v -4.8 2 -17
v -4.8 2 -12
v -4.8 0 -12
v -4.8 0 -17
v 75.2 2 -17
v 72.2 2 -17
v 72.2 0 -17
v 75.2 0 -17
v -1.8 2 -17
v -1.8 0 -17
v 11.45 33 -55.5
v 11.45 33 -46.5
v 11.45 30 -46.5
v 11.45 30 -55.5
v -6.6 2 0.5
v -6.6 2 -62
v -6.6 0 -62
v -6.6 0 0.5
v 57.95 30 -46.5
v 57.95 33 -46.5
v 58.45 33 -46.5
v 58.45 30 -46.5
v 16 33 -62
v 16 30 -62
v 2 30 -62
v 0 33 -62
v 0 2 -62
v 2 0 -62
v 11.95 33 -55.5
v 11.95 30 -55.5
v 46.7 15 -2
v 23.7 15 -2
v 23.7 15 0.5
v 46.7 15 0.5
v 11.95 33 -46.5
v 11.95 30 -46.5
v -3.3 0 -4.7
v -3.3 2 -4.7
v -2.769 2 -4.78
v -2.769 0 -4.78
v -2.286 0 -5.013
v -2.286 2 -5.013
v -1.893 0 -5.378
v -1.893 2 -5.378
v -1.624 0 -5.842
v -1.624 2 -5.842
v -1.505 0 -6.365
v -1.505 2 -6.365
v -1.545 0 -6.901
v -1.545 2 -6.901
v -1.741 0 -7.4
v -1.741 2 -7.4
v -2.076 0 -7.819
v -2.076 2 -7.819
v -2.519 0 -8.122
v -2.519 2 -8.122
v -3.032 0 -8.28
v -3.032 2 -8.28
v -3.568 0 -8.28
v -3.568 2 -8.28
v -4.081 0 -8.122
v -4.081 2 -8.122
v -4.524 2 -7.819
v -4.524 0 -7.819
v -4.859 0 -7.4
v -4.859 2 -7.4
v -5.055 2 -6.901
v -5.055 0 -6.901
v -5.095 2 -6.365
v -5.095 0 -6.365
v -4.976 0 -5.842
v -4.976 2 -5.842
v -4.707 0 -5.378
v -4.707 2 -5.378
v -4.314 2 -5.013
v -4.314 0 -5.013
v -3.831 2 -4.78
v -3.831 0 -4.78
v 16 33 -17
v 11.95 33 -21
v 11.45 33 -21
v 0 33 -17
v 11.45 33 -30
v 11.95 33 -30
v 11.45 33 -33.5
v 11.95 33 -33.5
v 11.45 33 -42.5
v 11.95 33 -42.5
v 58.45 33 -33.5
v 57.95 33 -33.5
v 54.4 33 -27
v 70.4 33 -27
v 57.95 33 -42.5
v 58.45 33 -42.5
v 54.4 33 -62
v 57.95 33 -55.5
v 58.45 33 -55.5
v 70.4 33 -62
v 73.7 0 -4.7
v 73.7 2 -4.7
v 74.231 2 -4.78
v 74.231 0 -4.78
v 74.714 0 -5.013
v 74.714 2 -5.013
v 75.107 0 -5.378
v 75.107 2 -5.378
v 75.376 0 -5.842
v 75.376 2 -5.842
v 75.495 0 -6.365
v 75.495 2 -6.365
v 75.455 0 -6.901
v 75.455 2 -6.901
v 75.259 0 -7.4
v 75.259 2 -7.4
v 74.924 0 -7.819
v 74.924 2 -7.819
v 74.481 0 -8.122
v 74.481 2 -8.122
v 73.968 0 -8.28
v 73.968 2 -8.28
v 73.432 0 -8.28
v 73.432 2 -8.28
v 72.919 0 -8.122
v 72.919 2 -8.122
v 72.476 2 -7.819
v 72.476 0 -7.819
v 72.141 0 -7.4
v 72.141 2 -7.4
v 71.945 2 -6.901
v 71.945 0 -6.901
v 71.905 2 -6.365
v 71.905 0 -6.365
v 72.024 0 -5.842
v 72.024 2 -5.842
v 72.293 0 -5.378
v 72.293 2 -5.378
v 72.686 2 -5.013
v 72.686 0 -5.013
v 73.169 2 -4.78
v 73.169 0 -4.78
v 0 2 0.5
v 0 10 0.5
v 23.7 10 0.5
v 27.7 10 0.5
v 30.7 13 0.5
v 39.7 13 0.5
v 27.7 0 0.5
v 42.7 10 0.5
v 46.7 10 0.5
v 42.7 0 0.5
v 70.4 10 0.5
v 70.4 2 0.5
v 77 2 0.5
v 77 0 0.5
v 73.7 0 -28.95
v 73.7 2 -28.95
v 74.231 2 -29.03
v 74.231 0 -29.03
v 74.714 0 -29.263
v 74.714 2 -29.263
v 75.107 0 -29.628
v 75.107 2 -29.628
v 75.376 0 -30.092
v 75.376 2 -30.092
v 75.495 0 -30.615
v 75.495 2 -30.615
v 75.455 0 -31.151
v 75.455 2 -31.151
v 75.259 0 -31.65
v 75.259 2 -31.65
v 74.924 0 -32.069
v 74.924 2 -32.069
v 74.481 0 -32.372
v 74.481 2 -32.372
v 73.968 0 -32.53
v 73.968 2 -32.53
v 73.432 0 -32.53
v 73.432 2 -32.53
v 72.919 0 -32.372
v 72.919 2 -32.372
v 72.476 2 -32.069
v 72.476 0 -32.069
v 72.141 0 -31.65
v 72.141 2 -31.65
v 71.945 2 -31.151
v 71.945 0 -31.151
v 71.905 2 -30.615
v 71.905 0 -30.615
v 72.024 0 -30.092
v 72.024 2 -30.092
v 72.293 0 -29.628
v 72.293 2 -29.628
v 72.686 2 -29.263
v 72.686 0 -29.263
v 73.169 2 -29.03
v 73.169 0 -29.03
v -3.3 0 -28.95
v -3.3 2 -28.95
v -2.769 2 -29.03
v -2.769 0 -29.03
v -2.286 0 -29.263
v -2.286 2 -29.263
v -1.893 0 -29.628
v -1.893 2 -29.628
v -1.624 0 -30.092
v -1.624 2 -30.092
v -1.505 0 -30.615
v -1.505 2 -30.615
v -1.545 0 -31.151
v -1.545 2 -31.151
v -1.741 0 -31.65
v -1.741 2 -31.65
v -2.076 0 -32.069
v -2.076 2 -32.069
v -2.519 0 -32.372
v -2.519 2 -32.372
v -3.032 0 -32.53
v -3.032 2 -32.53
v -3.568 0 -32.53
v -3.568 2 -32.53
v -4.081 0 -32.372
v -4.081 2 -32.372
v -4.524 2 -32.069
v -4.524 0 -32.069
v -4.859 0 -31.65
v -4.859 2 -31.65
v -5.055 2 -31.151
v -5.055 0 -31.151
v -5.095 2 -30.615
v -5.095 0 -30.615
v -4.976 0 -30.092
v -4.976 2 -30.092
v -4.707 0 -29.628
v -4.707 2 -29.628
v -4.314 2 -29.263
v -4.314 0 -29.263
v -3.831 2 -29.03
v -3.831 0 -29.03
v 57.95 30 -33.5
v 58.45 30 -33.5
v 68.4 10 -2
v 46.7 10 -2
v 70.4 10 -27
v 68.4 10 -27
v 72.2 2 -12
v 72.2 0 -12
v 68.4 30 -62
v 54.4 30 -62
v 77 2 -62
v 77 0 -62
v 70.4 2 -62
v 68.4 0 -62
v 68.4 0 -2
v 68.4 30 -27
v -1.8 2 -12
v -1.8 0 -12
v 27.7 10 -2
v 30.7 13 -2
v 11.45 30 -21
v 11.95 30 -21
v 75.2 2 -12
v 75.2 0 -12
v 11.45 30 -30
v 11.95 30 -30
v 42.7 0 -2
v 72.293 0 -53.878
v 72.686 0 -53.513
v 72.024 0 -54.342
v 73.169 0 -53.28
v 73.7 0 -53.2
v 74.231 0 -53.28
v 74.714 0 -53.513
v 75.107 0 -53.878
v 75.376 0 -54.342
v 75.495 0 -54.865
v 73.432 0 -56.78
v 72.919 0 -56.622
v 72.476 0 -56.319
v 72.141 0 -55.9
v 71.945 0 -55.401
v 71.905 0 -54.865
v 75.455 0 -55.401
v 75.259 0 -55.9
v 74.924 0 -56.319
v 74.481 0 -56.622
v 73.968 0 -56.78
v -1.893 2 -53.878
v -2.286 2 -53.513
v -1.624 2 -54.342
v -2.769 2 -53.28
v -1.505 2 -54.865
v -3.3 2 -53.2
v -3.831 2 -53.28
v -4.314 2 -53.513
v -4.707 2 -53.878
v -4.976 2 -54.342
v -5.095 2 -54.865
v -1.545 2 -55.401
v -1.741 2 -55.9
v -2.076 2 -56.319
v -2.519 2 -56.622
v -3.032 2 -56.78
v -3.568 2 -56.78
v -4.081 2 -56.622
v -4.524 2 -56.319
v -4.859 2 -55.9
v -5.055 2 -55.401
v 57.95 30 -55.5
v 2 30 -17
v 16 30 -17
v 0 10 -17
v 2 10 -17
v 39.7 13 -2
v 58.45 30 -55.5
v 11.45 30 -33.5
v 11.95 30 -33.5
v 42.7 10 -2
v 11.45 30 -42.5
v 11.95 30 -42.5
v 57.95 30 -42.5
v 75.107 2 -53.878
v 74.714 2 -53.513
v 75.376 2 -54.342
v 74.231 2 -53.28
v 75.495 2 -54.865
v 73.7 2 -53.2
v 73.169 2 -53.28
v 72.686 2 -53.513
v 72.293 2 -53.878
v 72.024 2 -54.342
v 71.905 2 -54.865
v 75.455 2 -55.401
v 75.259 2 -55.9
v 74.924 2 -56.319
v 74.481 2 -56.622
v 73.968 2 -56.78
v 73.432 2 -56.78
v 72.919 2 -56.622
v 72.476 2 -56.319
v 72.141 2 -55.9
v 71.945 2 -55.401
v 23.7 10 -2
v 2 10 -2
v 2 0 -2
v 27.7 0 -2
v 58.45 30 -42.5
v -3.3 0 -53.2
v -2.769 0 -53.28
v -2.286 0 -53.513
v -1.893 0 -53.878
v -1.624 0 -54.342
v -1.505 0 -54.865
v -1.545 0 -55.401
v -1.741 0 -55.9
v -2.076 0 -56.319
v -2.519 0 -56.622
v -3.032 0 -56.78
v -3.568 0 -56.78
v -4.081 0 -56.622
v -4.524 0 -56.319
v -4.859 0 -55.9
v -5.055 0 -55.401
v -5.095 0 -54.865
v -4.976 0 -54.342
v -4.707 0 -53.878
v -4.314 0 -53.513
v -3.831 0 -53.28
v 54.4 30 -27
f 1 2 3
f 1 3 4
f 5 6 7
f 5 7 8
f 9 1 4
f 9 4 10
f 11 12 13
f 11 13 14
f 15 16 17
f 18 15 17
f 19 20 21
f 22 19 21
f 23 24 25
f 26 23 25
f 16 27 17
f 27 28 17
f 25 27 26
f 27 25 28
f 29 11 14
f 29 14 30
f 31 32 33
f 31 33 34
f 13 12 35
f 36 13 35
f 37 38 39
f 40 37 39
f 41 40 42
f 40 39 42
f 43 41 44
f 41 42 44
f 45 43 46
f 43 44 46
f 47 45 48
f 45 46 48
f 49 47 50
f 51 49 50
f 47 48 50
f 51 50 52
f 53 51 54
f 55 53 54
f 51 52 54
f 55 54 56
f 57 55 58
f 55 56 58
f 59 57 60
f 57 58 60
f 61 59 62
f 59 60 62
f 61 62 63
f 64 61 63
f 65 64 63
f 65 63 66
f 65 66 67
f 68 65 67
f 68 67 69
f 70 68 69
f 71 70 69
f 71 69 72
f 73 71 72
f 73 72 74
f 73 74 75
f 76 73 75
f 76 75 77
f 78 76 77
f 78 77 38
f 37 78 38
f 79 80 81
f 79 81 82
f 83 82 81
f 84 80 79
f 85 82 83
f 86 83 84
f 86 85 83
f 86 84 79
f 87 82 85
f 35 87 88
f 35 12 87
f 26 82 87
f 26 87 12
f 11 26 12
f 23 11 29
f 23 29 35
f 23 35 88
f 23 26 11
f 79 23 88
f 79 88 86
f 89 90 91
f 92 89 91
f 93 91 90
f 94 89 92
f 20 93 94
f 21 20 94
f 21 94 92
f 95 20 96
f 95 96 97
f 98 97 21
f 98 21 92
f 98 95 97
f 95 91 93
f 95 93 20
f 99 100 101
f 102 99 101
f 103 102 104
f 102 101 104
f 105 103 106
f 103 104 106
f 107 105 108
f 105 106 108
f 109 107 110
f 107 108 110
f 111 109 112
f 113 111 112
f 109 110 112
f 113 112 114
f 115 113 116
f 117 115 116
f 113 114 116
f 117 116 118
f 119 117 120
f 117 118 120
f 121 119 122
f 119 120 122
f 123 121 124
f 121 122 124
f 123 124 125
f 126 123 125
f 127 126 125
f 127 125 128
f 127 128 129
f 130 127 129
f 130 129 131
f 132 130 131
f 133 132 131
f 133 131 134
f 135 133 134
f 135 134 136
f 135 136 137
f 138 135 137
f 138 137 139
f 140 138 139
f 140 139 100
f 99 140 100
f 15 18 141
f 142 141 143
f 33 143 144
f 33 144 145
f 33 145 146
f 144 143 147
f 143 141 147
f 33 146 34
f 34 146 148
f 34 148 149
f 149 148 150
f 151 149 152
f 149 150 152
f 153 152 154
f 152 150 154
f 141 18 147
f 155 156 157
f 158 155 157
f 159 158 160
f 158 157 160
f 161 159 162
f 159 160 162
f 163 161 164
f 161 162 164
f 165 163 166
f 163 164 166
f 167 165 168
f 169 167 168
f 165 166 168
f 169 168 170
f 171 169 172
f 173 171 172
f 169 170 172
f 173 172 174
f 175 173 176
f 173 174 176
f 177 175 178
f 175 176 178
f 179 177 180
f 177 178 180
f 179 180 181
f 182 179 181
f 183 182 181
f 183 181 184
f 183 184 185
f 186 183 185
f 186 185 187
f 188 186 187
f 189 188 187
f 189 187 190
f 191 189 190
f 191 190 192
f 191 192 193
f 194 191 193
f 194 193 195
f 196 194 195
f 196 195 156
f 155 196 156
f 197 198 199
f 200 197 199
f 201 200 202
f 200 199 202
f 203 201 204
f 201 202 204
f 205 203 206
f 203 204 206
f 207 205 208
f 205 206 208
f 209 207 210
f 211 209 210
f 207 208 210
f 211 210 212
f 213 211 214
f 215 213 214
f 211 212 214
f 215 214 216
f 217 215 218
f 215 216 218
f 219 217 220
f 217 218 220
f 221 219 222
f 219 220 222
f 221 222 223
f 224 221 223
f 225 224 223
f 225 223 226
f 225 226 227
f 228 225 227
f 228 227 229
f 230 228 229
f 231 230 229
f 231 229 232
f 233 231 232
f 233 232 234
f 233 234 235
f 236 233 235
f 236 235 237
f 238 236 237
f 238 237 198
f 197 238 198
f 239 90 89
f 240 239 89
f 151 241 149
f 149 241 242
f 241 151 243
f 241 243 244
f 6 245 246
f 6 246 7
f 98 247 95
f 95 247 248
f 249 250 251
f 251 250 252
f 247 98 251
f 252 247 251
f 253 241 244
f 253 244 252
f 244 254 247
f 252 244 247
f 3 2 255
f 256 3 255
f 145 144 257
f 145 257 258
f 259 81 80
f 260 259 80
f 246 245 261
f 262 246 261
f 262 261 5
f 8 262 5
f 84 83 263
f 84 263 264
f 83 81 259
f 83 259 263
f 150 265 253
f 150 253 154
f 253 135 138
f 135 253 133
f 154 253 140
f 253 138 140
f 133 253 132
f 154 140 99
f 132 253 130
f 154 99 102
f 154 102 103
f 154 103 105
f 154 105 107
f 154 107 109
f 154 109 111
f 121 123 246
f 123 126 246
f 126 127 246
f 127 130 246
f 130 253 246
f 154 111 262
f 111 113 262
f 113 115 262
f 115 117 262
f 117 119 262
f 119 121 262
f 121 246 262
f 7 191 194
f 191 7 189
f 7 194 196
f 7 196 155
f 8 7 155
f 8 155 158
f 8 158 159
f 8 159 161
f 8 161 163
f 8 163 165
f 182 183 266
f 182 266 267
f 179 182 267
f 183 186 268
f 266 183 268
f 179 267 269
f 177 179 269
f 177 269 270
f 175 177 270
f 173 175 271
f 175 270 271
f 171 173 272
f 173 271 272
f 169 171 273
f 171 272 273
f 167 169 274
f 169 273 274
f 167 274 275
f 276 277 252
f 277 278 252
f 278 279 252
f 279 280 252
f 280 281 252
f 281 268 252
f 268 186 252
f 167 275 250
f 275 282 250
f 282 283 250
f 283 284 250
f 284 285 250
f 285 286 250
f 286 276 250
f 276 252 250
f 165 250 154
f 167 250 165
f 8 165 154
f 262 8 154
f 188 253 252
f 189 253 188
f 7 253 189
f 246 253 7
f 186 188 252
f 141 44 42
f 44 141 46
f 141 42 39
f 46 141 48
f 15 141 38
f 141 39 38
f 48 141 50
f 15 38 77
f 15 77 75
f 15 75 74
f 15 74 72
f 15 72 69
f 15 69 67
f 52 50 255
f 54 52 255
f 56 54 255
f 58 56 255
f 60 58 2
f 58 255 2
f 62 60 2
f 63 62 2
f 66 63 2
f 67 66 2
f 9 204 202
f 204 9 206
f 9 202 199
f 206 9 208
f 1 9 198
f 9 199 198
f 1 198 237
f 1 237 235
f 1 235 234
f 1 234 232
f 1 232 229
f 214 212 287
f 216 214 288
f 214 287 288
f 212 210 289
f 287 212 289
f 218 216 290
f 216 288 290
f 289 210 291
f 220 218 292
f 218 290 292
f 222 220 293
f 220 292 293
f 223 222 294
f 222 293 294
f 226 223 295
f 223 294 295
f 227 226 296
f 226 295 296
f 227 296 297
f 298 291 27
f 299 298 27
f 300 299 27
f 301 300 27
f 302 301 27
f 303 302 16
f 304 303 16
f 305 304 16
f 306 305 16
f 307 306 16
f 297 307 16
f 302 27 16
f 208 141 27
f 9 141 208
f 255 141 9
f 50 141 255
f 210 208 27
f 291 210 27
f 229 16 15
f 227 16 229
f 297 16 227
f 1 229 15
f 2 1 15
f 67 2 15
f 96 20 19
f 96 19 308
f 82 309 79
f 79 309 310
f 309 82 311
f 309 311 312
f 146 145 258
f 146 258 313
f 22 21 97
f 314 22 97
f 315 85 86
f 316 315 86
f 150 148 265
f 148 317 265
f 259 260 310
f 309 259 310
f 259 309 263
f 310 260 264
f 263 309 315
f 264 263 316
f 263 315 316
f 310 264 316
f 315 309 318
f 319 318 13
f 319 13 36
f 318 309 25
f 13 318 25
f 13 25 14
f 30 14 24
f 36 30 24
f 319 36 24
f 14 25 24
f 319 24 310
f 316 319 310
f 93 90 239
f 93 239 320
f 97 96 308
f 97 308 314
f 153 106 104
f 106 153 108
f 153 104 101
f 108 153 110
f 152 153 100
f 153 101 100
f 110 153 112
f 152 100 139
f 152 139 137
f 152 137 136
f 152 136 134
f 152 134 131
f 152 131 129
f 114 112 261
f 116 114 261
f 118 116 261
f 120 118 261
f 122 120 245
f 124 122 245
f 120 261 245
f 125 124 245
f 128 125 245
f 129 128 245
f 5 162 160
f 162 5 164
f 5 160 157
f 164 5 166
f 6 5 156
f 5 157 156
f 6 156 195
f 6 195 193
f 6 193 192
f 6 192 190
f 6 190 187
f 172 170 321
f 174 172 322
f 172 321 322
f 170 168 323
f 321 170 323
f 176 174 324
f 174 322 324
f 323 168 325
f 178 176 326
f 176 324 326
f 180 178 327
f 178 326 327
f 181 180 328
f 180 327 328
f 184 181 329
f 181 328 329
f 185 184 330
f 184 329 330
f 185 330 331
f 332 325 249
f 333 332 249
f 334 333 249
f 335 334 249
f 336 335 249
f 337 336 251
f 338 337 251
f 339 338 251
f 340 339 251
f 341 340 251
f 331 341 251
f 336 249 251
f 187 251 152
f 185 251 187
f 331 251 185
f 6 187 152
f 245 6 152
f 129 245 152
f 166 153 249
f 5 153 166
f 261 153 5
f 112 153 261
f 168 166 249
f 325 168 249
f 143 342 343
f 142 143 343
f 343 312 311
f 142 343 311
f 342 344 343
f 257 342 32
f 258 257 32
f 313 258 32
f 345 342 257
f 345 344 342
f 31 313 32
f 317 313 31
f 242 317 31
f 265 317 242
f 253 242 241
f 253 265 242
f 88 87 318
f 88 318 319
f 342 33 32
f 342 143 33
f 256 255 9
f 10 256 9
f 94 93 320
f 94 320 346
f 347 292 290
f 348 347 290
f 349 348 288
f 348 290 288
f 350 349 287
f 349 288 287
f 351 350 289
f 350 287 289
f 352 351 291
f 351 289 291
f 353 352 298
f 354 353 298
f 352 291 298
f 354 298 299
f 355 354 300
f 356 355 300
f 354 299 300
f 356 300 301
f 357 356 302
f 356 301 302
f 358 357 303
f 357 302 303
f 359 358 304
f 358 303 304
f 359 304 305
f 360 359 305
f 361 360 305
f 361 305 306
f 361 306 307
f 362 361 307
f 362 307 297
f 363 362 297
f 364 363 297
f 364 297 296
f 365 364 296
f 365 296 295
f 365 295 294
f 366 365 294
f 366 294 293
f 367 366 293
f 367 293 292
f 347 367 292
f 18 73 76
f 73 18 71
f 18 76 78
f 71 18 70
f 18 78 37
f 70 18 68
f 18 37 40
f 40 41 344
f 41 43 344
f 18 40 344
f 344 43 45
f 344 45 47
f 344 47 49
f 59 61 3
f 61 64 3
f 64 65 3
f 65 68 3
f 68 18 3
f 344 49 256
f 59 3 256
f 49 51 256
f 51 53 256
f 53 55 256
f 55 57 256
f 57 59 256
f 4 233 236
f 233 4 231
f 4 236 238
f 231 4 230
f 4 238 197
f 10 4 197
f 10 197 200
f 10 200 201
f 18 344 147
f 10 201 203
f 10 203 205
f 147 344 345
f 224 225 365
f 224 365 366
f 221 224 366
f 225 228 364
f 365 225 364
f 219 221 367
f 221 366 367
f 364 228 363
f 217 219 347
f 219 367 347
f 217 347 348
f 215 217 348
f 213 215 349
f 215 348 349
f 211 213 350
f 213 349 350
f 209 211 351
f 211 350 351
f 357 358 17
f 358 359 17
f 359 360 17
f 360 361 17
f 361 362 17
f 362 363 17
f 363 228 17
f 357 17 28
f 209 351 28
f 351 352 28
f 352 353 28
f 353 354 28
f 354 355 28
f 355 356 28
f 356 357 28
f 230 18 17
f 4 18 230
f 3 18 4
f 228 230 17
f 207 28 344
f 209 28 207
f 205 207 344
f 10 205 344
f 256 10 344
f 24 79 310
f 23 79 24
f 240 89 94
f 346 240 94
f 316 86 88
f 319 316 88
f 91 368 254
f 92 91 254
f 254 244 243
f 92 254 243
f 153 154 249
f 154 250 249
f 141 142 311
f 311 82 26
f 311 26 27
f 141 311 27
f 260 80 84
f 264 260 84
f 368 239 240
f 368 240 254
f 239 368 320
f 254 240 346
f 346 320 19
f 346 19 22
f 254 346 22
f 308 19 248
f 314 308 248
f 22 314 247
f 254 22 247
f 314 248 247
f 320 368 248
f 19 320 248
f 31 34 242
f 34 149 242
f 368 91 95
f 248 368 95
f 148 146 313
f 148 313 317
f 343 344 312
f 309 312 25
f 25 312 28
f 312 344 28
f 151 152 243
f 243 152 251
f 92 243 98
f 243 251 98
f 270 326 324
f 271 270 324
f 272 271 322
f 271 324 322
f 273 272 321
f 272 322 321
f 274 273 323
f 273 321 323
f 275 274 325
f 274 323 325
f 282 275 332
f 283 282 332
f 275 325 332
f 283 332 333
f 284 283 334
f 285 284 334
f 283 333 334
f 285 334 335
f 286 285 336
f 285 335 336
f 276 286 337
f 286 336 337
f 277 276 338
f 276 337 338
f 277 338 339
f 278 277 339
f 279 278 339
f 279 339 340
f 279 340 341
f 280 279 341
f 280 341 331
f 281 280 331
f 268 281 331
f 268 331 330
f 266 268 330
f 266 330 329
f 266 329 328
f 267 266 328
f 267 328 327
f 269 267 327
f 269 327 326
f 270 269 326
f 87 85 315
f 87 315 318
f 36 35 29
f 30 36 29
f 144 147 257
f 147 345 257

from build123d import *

# Parameters (mm, degrees)
SKETCH1_W            = 70.4
SKETCH1_H            = 2
BOSS_EXTRUDE2_DEPTH  = 10
SKETCH2_W            = 2
SKETCH2_H            = 55
BOSS_EXTRUDE3_DEPTH  = 10
SKETCH3_W            = 19
SKETCH3_H            = 3
BOSS_EXTRUDE4_DEPTH  = 2
SKETCH4_W            = 15
SKETCH4_H            = 10
CUT_EXTRUDE2_DEPTH   = 2
SKETCH5_W            = 2
SKETCH5_H            = 3
BOSS_EXTRUDE5_DEPTH  = 1
SKETCH6_W            = 2
SKETCH6_H            = 3
BOSS_EXTRUDE6_DEPTH  = 1
SKETCH7_W            = 57
SKETCH7_H            = 2
BOSS_EXTRUDE7_DEPTH  = 6.6
SKETCH8_W            = 57
SKETCH8_H            = 2
BOSS_EXTRUDE8_DEPTH  = 6.6
BOSS_EXTRUDE9_DEPTH  = 5
SKETCH12_W           = 2
SKETCH12_H           = 5
SKETCH12_H_2         = 40
SKETCH12_H_3         = 30
BOSS_EXTRUDE10_DEPTH = 20
BOSS_EXTRUDE11_DEPTH = 3
SKETCH14_W           = 0.5
SKETCH14_H           = 9
CUT_EXTRUDE3_DEPTH   = 3
SKETCH15_W           = 38.4
SKETCH15_H           = 45
CUT_EXTRUDE4_DEPTH   = 3
BOSS_EXTRUDE12_DEPTH = 0.5
SKETCH17_R           = 1.8
SKETCH17_W           = 3
SKETCH17_H           = 5
CUT_EXTRUDE6_DEPTH   = 3
SKETCH18_W           = 2.5
SKETCH18_H           = 3
BOSS_EXTRUDE13_DEPTH = 1
SKETCH19_W           = 2.5
SKETCH19_H           = 3
BOSS_EXTRUDE14_DEPTH = 1
SKETCH20_W           = 23
SKETCH20_H           = 2.5
BOSS_EXTRUDE15_DEPTH = 2
CUT_EXTRUDE8_DEPTH   = 3


with BuildPart() as part:
    # Sketch1 → Boss-Extrude2 (new body)
    with BuildSketch(Plane(origin=(0, 0, 0), x_dir=(1, 0, 0), z_dir=(0, 1, 0))):
        with Locations((35.2, 1)):
            Rectangle(SKETCH1_W, SKETCH1_H)
    extrude(amount=BOSS_EXTRUDE2_DEPTH)

    # Sketch2 → Boss-Extrude3 (add)
    with BuildSketch(Plane(origin=(0, 10, 0), x_dir=(1, 0, 0), z_dir=(0, 1, 0))):
        with Locations((1, 29.5)):
            Rectangle(SKETCH2_W, SKETCH2_H)
        with Locations((69.4, 29.5)):
            Rectangle(SKETCH2_W, SKETCH2_H)
    extrude(amount=-BOSS_EXTRUDE3_DEPTH)

    # Sketch3 → Boss-Extrude4 (add)
    with BuildSketch(Plane.XY):
        with Locations((35.2, 11.5)):
            Rectangle(SKETCH3_W, SKETCH3_H)
    extrude(amount=-BOSS_EXTRUDE4_DEPTH)

    # Sketch4 → Cut-Extrude2 (cut)
    with BuildSketch(Plane.XY):
        with Locations((35.2, 5)):
            Rectangle(SKETCH4_W, SKETCH4_H)
    extrude(amount=-CUT_EXTRUDE2_DEPTH, mode=Mode.SUBTRACT)

    # Sketch5 → Boss-Extrude5 (add)
    with BuildSketch(Plane.ZY.offset(-25.7)):
        with Locations((-1, 11.5)):
            Rectangle(SKETCH5_W, SKETCH5_H)
    extrude(amount=BOSS_EXTRUDE5_DEPTH)

    # Sketch6 → Boss-Extrude6 (add)
    with BuildSketch(Plane(origin=(44.7, 0, 0), x_dir=(0, 0, -1), z_dir=(1, 0, 0))):
        with Locations((1, 11.5)):
            Rectangle(SKETCH6_W, SKETCH6_H)
    extrude(amount=BOSS_EXTRUDE6_DEPTH)

    # Sketch7 → Boss-Extrude7 (add)
    with BuildSketch(Plane.ZY):
        with Locations((-28.5, 1)):
            Rectangle(SKETCH7_W, SKETCH7_H)
    extrude(amount=BOSS_EXTRUDE7_DEPTH)

    # Sketch8 → Boss-Extrude8 (add)
    with BuildSketch(Plane(origin=(70.4, 0, 0), x_dir=(0, 0, -1), z_dir=(1, 0, 0))):
        with Locations((28.5, 1)):
            Rectangle(SKETCH8_W, SKETCH8_H)
    extrude(amount=BOSS_EXTRUDE8_DEPTH)

    # Sketch10 → Boss-Extrude9 (add)
    with BuildSketch(Plane(origin=(0, 0, -57), x_dir=(-1, 0, 0), z_dir=(0, 0, -1))):
        Polygon((-2, 10), (-2, 0), (6.6, 0), (6.6, 2), (0, 2), (0, 10), align=None)
        Polygon((-77, 0), (-68.4, 0), (-68.4, 10), (-70.4, 10), (-70.4, 2), (-77, 2), align=None)
    extrude(amount=BOSS_EXTRUDE9_DEPTH)

    # Sketch12 → Boss-Extrude10 (add)
    with BuildSketch(Plane(origin=(0, 10, 0), x_dir=(1, 0, 0), z_dir=(0, 1, 0))):
        with Locations((1, 59.5)):
            Rectangle(SKETCH12_W, SKETCH12_H)
        with Locations((1, 37)):
            Rectangle(SKETCH12_W, SKETCH12_H_2)
        with Locations((69.4, 42)):
            Rectangle(SKETCH12_W, SKETCH12_H_3)
        with Locations((69.4, 59.5)):
            Rectangle(SKETCH12_W, SKETCH12_H)
    extrude(amount=BOSS_EXTRUDE10_DEPTH)

    # Sketch13 → Boss-Extrude11 (add)
    with BuildSketch(Plane(origin=(0, 30, 0), x_dir=(1, 0, 0), z_dir=(0, 1, 0))):
        Polygon((0, 17), (35.2, 17), (35.2, 27), (70.4, 27), (70.4, 62), (0, 62), align=None)
    extrude(amount=BOSS_EXTRUDE11_DEPTH)

    # Sketch14 → Cut-Extrude3 (cut)
    with BuildSketch(Plane(origin=(0, 33, 0), x_dir=(1, 0, 0), z_dir=(0, 1, 0))):
        with Locations((11.7, 51)):
            Rectangle(SKETCH14_W, SKETCH14_H)
        with Locations((11.7, 38)):
            Rectangle(SKETCH14_W, SKETCH14_H)
        with Locations((11.7, 25.5)):
            Rectangle(SKETCH14_W, SKETCH14_H)
        with Locations((58.2, 51)):
            Rectangle(SKETCH14_W, SKETCH14_H)
        with Locations((58.2, 38)):
            Rectangle(SKETCH14_W, SKETCH14_H)
    extrude(amount=-CUT_EXTRUDE3_DEPTH, mode=Mode.SUBTRACT)

    # Sketch15 → Cut-Extrude4 (cut)
    with BuildSketch(Plane(origin=(0, 33, 0), x_dir=(1, 0, 0), z_dir=(0, 1, 0))):
        with Locations((35.2, 39.5)):
            Rectangle(SKETCH15_W, SKETCH15_H)
    extrude(amount=-CUT_EXTRUDE4_DEPTH, mode=Mode.SUBTRACT)

    # Sketch16 → Boss-Extrude12 (add)
    with BuildSketch(Plane.XY):
        Polygon((-6.6, 0), (27.7, 0), (27.7, 10), (42.7, 10), (42.7, 0), (77, 0), (77, 2), (70.4, 2), (70.4, 10), (45.7, 10), (45.7, 13), (24.7, 13), (24.7, 10), (0, 10), (0, 2), (-6.6, 2), align=None)
    extrude(amount=BOSS_EXTRUDE12_DEPTH)

    # Sketch17 → Cut-Extrude6 (cut)
    with BuildSketch(Plane(origin=(0, 2, 0), x_dir=(1, 0, 0), z_dir=(0, 1, 0))):
        with Locations(Location((-3.3, 55, 0), (0, 0, 270))):
            Circle(SKETCH17_R)
        with Locations(Location((73.7, 55, 0), (0, 0, 270))):
            Circle(SKETCH17_R)
        with Locations(Location((-3.3, 6.5, 0), (0, 0, 270))):
            Circle(SKETCH17_R)
        with Locations(Location((73.7, 6.5, 0), (0, 0, 270))):
            Circle(SKETCH17_R)
        with Locations(Location((-3.3, 30.75, 0), (0, 0, 270))):
            Circle(SKETCH17_R)
        with Locations(Location((73.7, 30.75, 0), (0, 0, 270))):
            Circle(SKETCH17_R)
        with Locations((-3.3, 14.5)):
            Rectangle(SKETCH17_W, SKETCH17_H)
        with Locations((73.7, 14.5)):
            Rectangle(SKETCH17_W, SKETCH17_H)
    extrude(amount=-CUT_EXTRUDE6_DEPTH, mode=Mode.SUBTRACT)

    # Sketch18 → Boss-Extrude13 (add)
    with BuildSketch(Plane.ZY.offset(-24.7)):
        with Locations((-0.75, 11.5)):
            Rectangle(SKETCH18_W, SKETCH18_H)
    extrude(amount=BOSS_EXTRUDE13_DEPTH)

    # Sketch19 → Boss-Extrude14 (add)
    with BuildSketch(Plane(origin=(45.7, 0, 0), x_dir=(0, 0, -1), z_dir=(1, 0, 0))):
        with Locations((0.75, 11.5)):
            Rectangle(SKETCH19_W, SKETCH19_H)
    extrude(amount=BOSS_EXTRUDE14_DEPTH)

    # Sketch20 → Boss-Extrude15 (add)
    with BuildSketch(Plane(origin=(0, 13, 0), x_dir=(1, 0, 0), z_dir=(0, 1, 0))):
        with Locations((35.2, 0.75)):
            Rectangle(SKETCH20_W, SKETCH20_H)
    extrude(amount=BOSS_EXTRUDE15_DEPTH)

    # Sketch21 → Cut-Extrude8 (cut)
    with BuildSketch(Plane.XY.offset(0.5)):
        Polygon((27.7, 10), (30.7, 13), (39.7, 13), (42.7, 10), align=None)
    extrude(amount=-CUT_EXTRUDE8_DEPTH, mode=Mode.SUBTRACT)


solid = part.part
